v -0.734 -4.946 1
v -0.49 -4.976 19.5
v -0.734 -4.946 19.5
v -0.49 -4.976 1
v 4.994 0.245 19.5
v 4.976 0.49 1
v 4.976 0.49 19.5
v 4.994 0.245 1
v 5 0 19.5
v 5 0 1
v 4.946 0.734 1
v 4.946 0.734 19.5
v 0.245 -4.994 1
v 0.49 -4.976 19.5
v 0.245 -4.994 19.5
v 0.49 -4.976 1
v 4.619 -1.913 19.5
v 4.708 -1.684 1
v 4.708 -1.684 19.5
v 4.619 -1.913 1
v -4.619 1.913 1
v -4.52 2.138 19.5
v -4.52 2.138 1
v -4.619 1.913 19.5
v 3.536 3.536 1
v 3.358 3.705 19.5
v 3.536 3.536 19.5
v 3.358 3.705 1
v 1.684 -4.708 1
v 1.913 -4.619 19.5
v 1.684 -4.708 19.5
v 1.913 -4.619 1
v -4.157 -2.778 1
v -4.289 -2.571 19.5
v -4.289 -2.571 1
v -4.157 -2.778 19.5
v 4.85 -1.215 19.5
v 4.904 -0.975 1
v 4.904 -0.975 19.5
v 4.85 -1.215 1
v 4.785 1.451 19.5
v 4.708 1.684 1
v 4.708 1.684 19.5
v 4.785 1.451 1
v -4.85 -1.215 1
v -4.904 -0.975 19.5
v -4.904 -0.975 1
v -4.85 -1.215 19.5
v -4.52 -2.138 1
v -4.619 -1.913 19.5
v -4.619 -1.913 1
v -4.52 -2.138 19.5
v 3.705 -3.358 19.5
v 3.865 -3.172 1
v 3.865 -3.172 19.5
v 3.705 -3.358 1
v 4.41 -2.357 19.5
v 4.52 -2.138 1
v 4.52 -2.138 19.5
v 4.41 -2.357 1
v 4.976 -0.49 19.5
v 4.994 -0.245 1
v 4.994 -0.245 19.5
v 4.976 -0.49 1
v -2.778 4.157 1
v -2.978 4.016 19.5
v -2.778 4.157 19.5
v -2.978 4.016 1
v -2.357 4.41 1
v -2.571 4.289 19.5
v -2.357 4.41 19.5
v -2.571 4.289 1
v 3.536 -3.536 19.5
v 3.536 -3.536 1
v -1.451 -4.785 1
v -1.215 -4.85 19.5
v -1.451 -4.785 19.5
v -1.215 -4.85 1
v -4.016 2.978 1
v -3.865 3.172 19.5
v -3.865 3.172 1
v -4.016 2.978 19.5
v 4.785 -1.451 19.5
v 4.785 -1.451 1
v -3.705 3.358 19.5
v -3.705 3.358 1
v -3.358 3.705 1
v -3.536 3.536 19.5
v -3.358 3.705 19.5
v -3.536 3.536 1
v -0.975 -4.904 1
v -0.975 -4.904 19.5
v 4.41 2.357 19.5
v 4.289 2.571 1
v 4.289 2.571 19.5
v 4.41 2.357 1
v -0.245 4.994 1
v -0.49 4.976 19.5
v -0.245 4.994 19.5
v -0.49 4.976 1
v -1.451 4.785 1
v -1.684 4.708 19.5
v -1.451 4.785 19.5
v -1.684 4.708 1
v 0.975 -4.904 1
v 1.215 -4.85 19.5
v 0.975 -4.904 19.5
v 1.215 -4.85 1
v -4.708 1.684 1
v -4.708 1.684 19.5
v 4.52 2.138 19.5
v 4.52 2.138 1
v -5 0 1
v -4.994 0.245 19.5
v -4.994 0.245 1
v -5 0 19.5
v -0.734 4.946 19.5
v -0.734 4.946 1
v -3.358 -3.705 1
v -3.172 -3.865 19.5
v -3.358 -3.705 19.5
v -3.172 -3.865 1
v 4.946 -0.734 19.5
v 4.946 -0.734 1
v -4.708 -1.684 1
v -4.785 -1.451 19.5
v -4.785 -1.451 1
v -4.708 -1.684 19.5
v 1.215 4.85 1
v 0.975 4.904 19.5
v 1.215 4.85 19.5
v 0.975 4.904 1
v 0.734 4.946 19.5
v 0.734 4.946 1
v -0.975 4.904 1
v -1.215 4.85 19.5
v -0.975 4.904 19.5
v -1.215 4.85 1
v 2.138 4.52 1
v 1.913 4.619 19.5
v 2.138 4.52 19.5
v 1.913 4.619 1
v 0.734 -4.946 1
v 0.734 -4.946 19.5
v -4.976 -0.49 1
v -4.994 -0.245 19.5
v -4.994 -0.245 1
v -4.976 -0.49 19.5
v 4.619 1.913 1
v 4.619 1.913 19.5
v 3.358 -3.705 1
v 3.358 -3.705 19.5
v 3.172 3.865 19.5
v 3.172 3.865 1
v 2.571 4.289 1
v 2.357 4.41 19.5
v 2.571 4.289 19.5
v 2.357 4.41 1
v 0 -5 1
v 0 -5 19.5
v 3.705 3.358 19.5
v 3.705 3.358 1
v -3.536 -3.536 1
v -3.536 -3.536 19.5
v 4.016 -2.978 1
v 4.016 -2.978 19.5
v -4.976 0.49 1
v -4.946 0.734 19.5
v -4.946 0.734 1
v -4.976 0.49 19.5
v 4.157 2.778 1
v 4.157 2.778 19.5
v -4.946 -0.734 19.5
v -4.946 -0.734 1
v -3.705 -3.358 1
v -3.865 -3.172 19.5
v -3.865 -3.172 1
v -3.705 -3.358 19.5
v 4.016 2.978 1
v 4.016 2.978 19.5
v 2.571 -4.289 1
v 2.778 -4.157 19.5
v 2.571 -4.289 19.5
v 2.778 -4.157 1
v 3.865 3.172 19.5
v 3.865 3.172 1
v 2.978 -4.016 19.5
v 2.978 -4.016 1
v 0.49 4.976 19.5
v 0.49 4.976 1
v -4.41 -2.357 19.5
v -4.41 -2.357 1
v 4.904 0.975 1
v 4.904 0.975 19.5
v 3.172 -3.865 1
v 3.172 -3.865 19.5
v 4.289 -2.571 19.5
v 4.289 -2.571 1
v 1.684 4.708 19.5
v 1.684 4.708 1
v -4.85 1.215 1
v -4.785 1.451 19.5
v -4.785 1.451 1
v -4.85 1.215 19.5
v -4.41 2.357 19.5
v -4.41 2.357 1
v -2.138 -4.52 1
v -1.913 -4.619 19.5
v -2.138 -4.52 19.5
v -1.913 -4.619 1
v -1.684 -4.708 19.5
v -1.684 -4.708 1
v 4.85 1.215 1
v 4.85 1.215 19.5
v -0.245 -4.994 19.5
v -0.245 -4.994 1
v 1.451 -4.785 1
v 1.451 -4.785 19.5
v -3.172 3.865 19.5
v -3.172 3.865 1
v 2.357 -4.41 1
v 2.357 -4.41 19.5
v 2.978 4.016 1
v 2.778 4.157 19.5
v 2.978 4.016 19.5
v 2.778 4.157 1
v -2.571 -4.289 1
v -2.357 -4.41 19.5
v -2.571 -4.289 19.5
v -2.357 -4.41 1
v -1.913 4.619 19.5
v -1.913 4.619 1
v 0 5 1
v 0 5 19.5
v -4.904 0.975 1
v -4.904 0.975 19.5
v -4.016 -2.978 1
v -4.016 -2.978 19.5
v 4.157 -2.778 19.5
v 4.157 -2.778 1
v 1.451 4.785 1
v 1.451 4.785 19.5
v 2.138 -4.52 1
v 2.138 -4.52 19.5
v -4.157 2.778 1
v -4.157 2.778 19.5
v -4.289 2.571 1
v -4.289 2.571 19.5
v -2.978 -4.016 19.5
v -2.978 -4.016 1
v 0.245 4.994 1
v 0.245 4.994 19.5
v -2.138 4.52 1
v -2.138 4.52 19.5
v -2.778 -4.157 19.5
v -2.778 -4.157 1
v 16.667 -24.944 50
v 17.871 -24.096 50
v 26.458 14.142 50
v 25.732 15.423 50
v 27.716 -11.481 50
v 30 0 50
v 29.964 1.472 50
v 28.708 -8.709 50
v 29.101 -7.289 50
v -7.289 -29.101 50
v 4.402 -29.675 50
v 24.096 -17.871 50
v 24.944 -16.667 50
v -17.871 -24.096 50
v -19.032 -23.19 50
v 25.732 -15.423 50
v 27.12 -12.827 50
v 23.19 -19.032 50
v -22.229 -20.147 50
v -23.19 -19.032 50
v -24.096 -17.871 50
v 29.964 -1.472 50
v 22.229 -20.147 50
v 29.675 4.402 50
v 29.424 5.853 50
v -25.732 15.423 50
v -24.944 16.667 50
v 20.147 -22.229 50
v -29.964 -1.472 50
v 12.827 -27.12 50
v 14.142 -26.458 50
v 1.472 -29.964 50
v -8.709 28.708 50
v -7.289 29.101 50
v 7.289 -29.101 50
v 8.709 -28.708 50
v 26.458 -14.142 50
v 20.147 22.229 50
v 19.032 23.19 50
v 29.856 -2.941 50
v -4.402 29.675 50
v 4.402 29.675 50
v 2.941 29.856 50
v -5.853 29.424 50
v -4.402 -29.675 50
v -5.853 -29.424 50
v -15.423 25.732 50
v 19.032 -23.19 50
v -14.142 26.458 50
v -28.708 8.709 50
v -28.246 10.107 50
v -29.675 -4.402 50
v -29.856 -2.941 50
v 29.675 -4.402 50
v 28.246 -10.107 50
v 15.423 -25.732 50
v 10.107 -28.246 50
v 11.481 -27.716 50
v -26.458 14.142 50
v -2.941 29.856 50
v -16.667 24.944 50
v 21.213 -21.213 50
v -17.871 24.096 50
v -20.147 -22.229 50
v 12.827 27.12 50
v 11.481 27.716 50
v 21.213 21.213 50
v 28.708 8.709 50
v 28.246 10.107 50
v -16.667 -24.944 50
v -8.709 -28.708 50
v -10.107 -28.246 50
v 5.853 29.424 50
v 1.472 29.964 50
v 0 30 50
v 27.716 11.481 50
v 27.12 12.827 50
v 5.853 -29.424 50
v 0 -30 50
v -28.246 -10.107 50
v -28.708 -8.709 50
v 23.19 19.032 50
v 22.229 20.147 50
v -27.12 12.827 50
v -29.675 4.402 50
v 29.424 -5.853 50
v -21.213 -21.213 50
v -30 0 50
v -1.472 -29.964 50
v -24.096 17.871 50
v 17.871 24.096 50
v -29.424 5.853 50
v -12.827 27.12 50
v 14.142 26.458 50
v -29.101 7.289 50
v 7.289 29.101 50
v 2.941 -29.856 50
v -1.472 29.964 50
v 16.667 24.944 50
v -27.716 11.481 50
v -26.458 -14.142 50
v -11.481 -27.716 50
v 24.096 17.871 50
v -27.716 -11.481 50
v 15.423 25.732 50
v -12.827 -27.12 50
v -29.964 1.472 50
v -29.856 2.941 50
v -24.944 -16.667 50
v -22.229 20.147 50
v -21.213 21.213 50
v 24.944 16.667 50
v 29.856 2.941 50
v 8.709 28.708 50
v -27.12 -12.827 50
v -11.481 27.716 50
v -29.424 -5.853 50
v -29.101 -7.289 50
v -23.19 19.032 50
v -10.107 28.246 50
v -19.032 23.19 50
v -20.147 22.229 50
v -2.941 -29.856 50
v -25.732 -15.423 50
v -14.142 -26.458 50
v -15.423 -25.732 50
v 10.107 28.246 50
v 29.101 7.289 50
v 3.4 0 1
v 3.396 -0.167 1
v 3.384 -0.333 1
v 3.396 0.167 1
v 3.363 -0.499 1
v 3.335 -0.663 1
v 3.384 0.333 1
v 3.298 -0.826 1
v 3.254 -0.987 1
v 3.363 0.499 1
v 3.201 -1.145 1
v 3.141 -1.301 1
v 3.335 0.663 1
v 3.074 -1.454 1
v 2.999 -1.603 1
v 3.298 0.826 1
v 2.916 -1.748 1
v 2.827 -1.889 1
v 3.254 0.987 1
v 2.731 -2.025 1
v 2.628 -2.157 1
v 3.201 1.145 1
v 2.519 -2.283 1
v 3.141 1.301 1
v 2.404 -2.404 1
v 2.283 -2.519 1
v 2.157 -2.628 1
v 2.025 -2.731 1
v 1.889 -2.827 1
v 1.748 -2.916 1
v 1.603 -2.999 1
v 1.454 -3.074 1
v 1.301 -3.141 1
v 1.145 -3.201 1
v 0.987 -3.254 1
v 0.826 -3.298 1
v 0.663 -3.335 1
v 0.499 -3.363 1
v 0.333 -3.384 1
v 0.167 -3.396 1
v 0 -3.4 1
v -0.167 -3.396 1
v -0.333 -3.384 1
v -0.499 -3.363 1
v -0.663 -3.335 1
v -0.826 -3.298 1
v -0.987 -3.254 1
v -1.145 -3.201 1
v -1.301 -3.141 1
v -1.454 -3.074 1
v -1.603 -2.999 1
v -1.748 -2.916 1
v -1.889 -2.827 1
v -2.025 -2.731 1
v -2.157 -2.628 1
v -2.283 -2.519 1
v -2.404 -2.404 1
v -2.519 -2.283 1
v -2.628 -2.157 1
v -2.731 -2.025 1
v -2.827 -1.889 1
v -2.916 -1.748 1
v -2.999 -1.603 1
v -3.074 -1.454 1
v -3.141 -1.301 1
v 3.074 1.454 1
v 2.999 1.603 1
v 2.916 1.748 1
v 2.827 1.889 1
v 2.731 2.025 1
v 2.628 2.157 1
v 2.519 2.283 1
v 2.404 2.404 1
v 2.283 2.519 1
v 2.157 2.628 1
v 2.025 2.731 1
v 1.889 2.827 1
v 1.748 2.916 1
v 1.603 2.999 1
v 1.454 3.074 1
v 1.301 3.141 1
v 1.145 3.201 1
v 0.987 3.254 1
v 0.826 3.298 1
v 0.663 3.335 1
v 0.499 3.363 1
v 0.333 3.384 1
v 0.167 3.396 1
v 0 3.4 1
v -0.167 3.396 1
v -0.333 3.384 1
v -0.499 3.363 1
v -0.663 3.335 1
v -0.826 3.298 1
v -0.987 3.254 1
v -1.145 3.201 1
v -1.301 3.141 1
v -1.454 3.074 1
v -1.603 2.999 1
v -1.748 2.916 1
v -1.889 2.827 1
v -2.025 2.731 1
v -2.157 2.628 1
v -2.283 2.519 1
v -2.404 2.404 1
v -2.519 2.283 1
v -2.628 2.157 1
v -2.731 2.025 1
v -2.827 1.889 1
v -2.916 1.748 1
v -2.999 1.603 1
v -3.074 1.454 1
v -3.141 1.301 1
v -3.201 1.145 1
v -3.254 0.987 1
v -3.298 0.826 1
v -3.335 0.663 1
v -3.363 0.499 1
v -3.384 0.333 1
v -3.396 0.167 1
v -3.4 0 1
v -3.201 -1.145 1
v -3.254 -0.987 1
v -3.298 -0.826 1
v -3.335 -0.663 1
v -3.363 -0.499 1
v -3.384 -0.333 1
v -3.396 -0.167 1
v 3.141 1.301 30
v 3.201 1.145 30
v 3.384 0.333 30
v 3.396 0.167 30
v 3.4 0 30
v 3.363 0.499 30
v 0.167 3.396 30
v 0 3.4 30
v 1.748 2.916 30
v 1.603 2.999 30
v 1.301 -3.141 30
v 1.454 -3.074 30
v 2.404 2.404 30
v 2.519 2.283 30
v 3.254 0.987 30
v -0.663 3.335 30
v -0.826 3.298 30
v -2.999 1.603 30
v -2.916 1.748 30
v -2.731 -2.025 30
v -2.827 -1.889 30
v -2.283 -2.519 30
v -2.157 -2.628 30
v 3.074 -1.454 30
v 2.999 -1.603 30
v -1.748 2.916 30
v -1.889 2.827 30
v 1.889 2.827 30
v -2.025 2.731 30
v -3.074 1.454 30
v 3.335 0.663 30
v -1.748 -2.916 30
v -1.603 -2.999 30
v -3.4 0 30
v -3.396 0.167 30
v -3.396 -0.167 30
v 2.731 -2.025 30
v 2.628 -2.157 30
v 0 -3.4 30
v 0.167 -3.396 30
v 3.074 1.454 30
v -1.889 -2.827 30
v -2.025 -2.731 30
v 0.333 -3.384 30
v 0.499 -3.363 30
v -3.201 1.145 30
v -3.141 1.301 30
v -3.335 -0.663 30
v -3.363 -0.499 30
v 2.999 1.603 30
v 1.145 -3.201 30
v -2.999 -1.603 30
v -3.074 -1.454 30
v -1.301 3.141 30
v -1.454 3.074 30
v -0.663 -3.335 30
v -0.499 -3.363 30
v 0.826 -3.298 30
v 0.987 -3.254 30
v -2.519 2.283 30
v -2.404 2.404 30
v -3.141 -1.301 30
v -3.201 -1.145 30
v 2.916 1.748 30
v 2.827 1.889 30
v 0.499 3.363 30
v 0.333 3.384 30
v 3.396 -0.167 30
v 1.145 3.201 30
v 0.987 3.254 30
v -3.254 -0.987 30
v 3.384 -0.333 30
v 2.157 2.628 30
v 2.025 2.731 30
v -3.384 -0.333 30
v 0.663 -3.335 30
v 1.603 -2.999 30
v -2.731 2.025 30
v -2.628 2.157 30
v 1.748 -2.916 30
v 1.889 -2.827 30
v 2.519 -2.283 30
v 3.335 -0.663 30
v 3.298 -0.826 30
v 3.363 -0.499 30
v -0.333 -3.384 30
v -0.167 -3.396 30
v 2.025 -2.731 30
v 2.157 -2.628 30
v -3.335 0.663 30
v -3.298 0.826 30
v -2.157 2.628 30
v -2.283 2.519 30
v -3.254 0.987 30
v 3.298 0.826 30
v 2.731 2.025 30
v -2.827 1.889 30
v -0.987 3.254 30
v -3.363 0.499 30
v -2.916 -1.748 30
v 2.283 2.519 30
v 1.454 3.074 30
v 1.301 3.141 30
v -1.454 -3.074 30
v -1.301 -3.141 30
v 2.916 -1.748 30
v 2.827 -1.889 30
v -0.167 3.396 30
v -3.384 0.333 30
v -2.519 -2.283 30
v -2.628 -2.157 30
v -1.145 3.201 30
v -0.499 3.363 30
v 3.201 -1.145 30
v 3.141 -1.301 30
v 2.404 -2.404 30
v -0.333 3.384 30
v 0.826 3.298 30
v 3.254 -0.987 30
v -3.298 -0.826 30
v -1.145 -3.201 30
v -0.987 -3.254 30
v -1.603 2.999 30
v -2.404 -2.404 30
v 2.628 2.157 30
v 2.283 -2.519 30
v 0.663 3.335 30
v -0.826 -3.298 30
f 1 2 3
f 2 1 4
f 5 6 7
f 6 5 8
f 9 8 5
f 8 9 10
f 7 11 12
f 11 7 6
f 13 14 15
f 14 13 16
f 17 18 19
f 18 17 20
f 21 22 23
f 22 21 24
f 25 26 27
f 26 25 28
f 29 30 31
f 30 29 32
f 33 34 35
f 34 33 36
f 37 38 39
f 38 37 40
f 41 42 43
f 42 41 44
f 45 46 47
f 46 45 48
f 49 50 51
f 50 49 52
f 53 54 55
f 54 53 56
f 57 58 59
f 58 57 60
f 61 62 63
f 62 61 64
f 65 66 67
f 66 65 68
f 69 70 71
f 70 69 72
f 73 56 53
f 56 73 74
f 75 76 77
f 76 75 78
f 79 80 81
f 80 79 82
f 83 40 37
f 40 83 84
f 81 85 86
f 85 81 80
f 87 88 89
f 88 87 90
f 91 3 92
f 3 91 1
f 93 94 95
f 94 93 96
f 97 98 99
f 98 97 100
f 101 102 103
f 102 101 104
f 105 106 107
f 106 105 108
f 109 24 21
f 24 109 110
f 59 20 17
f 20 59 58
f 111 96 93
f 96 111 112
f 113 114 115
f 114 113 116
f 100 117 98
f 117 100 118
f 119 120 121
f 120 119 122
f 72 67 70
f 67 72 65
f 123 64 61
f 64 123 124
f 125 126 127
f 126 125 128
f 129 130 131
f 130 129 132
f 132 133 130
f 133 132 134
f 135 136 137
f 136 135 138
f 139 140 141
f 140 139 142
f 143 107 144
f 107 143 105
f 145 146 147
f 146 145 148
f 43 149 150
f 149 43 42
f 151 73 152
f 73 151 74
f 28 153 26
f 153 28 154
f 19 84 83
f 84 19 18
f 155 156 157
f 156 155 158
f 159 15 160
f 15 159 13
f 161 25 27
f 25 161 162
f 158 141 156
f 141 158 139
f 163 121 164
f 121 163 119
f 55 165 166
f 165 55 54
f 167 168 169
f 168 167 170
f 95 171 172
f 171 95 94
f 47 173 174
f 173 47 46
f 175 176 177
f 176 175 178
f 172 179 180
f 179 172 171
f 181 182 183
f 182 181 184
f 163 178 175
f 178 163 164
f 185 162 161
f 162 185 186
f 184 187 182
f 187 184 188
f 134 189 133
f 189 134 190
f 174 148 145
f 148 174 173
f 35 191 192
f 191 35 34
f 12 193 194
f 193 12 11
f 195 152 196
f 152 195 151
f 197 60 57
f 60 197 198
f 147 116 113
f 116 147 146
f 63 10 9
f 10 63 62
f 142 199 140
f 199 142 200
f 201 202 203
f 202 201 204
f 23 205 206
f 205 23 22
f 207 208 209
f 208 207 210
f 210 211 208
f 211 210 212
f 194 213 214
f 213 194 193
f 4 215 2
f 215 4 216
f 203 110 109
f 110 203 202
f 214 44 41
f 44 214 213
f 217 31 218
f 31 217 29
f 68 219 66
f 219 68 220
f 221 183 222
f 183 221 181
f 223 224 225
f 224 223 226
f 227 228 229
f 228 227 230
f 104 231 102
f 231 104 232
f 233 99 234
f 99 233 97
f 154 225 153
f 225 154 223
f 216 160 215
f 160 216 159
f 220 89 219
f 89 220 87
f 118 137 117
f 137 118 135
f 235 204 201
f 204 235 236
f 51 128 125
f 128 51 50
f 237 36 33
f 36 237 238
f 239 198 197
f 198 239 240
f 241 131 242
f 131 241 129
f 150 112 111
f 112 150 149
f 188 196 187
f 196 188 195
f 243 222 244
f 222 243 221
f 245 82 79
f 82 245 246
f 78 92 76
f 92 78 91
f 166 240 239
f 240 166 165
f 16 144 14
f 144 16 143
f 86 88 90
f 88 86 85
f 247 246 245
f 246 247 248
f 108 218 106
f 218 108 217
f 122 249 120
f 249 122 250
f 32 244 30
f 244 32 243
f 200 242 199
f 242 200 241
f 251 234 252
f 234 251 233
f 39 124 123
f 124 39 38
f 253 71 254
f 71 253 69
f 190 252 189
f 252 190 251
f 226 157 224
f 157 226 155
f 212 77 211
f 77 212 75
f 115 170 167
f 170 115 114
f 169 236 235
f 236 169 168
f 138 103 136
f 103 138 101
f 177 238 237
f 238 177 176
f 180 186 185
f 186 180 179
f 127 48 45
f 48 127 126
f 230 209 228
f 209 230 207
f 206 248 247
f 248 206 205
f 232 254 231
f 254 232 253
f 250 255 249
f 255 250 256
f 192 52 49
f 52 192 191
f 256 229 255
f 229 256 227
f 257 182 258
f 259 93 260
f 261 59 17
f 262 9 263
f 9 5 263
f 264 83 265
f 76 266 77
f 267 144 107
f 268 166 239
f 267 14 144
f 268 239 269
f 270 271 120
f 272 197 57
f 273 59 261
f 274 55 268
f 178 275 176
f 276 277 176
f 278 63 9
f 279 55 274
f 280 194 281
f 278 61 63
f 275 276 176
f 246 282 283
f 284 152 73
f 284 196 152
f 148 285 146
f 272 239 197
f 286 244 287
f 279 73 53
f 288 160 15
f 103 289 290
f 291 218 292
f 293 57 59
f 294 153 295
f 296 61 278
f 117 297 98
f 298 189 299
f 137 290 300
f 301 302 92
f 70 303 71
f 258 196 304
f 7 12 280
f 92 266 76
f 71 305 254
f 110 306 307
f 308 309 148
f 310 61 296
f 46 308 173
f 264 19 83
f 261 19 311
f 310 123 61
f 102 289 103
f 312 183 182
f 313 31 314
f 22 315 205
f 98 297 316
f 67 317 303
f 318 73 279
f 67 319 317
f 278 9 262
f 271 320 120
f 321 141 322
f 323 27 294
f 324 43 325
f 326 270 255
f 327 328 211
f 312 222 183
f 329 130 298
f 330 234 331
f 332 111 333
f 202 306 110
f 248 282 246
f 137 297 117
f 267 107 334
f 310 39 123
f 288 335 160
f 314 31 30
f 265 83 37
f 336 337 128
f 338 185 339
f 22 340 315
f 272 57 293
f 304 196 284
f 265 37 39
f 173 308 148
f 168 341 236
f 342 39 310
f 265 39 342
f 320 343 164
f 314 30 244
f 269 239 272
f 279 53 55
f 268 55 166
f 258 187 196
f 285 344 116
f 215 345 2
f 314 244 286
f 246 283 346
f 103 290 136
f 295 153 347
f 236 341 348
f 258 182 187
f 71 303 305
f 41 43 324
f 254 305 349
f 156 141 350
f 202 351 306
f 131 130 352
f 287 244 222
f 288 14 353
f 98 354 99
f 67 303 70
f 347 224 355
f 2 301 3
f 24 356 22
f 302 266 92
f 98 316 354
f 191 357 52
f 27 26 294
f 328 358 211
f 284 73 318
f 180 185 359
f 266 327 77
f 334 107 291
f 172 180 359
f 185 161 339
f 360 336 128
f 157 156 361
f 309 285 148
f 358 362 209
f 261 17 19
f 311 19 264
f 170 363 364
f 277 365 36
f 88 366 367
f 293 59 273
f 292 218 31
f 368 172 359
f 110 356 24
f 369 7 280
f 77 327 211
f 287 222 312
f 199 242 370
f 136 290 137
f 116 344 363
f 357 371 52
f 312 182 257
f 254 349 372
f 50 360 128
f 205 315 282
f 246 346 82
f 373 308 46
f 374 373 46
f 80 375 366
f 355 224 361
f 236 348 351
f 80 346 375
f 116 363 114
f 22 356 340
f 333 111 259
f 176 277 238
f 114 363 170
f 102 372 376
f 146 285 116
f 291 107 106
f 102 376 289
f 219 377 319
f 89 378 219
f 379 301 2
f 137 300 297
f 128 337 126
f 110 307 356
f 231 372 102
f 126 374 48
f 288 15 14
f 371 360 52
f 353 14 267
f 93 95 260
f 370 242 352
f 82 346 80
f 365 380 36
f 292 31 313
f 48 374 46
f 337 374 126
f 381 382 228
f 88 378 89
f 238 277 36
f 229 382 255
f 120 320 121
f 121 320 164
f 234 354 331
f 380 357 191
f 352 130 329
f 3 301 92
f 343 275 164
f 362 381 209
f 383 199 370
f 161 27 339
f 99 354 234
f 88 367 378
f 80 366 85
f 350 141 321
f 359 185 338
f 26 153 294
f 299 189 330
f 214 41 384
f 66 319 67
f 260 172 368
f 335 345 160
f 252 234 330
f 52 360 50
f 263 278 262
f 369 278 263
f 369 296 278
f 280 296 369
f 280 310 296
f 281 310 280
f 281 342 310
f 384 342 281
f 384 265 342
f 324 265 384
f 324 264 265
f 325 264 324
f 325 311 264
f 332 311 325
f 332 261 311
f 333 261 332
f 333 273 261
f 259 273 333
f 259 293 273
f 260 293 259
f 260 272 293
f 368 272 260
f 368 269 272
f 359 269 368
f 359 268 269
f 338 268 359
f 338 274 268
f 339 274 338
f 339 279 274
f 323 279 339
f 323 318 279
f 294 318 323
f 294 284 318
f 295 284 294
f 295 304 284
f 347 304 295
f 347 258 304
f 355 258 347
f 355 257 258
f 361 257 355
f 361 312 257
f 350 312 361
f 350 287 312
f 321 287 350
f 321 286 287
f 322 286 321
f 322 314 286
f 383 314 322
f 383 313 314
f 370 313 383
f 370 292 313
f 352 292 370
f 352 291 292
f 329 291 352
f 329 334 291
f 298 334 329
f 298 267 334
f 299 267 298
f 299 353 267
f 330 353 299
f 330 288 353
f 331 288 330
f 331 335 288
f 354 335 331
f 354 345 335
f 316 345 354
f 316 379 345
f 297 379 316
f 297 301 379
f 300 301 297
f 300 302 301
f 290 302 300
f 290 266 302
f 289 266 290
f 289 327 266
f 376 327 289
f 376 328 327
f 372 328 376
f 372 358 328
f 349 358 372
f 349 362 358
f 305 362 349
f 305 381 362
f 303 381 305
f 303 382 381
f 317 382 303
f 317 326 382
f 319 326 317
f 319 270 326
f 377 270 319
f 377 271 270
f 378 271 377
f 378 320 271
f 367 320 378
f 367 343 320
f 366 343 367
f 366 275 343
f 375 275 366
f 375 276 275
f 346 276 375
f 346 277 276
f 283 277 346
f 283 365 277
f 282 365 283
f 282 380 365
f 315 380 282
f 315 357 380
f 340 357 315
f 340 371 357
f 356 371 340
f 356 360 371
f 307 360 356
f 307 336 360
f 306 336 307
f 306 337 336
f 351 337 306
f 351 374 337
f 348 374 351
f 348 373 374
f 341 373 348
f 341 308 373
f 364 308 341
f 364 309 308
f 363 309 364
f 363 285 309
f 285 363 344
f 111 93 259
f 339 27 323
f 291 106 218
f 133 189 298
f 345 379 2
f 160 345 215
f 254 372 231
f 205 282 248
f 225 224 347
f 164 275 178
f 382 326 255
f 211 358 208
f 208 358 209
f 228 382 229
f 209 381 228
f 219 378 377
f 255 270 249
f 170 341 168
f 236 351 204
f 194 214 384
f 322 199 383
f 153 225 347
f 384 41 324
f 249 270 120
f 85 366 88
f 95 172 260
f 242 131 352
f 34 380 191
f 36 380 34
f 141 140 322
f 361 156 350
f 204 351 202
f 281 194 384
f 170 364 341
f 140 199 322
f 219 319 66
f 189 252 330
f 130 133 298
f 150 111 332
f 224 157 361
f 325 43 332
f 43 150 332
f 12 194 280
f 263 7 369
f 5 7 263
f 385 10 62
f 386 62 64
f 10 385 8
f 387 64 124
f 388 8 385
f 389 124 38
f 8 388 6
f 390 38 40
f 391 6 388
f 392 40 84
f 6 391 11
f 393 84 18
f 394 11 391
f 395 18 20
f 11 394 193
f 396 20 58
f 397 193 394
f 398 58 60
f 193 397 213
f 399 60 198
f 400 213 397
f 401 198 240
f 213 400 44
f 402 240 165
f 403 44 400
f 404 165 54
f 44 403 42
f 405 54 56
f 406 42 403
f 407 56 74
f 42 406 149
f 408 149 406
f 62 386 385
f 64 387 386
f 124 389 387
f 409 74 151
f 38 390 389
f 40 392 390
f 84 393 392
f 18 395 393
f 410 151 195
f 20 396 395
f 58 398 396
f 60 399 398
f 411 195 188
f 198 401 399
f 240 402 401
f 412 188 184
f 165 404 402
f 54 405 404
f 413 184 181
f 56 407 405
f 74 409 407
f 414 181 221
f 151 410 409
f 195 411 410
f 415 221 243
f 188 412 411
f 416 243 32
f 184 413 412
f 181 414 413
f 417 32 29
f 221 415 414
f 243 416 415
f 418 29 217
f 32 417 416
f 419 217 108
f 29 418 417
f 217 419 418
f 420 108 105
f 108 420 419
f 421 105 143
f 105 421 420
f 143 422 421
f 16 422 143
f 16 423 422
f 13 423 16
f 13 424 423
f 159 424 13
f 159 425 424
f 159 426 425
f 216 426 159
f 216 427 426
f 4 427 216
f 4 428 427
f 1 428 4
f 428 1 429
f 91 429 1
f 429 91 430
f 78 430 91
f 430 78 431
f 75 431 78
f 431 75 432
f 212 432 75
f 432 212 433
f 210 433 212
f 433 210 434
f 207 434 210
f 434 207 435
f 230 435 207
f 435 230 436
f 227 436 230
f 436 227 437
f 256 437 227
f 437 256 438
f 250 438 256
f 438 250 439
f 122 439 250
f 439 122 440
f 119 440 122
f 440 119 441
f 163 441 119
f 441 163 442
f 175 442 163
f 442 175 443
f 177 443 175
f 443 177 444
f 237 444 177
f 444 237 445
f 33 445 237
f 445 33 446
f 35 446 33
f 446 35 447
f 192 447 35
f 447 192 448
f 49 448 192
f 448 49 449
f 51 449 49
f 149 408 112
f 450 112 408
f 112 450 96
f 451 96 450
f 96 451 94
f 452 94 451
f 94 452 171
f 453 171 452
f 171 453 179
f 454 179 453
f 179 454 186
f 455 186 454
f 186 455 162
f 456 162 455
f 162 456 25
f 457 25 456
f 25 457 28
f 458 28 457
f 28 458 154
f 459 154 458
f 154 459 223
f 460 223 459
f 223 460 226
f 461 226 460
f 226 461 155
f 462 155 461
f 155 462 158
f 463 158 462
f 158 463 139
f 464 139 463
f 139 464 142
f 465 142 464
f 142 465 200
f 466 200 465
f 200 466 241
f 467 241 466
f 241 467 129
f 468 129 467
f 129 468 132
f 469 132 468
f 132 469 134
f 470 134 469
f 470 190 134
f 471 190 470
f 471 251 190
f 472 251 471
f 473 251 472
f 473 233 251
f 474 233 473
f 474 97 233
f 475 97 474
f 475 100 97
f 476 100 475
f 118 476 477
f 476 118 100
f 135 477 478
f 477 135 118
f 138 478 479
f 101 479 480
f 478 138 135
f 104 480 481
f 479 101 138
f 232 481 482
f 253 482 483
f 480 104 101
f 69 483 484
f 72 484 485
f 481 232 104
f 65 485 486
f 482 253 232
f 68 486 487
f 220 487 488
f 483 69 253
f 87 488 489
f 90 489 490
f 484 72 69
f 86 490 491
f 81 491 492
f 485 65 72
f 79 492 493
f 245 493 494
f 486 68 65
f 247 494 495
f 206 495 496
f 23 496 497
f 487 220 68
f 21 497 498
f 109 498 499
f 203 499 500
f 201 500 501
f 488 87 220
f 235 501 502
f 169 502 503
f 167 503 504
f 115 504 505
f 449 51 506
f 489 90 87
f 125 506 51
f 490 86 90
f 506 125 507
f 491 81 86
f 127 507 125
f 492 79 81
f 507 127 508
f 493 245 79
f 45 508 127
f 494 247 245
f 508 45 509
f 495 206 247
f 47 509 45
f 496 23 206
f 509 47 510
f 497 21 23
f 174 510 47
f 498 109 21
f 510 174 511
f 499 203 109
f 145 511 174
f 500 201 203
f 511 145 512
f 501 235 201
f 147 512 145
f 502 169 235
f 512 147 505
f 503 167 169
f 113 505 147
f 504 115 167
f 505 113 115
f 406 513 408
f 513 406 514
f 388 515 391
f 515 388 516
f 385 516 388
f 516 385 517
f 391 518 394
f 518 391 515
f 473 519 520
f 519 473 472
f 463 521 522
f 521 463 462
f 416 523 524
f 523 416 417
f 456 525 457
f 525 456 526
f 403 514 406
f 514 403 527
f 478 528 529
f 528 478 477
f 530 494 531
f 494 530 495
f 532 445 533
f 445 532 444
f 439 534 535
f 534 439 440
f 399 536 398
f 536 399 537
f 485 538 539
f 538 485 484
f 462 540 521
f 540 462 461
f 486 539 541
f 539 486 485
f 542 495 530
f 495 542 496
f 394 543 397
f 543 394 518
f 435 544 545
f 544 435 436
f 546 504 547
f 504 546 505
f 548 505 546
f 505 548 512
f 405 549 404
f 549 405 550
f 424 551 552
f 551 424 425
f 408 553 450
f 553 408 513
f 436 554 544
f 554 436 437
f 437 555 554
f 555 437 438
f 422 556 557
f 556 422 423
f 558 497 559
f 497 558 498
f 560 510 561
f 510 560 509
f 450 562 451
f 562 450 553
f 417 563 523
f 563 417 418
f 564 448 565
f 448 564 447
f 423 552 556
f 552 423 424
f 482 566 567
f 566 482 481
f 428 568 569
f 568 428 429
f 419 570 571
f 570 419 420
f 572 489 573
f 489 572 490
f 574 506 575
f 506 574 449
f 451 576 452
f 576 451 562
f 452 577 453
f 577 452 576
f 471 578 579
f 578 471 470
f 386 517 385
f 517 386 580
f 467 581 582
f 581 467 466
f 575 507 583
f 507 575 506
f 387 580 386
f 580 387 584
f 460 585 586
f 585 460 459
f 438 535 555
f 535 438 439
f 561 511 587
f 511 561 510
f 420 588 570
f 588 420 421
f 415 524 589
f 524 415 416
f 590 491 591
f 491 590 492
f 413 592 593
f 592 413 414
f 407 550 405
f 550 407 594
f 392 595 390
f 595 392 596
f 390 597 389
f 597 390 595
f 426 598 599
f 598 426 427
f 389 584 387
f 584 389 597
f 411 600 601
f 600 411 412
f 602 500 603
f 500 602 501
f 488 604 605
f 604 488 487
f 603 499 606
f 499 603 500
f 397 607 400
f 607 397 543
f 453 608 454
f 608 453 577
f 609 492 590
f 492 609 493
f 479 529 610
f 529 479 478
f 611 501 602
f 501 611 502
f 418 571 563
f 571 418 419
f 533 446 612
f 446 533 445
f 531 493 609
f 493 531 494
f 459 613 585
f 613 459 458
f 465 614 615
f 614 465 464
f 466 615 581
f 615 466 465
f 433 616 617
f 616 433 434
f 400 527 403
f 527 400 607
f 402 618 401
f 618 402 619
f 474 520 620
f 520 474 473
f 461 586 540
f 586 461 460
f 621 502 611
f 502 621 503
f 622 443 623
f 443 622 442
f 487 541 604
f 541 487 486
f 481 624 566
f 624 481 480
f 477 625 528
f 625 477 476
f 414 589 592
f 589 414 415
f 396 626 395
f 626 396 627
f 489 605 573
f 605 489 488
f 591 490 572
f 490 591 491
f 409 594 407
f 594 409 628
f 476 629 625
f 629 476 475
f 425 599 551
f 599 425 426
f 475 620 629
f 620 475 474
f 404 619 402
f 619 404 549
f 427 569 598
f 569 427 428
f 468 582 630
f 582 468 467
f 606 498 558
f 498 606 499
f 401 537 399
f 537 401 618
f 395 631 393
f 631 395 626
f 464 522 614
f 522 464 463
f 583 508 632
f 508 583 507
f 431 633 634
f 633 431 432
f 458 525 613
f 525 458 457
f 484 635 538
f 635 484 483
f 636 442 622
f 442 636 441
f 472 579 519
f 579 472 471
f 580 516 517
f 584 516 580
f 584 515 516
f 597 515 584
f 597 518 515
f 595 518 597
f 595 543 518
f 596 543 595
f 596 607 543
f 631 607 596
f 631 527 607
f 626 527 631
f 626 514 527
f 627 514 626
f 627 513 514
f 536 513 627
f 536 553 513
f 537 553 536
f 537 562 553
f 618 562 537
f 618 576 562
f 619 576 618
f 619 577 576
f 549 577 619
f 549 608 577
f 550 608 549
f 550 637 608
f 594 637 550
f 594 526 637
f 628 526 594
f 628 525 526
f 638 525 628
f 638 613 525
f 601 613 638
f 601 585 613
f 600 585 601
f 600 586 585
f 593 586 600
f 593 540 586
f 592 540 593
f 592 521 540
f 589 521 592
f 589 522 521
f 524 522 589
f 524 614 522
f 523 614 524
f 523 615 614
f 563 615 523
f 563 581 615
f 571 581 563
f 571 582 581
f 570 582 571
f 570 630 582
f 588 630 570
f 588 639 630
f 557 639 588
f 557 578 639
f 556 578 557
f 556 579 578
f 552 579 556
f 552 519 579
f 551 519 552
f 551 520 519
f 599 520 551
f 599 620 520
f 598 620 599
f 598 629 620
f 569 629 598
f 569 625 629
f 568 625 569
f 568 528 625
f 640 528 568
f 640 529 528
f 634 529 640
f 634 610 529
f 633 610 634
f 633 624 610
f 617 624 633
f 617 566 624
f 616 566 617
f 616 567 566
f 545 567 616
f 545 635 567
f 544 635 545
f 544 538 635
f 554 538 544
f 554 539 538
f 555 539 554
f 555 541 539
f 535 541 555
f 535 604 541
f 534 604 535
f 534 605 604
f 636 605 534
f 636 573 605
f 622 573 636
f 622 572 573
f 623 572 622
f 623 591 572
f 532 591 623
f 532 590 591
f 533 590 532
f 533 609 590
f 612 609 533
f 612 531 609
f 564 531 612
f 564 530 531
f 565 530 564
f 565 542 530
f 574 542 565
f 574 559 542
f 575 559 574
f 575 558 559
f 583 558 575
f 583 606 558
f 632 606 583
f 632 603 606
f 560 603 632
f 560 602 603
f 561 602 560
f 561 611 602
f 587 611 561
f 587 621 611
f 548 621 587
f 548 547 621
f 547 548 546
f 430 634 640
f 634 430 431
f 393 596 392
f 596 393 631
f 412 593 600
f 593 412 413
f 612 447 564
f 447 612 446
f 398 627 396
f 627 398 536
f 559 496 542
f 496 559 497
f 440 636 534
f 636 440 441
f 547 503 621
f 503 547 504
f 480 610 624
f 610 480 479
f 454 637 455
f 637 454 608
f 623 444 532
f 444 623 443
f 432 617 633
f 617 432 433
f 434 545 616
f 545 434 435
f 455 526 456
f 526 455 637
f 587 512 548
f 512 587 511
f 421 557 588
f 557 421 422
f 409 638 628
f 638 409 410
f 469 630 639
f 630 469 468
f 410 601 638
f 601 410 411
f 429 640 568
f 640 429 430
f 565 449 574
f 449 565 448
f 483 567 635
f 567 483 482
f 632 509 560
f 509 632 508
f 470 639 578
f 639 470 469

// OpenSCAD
// Lab funnel - printed upright, wide opening at the top
// Straight spout from z = 0 to z = 20, conical body from z = 20 to z = 50

// ---- Dimensions (mm) ----
spout_od      = 10;    // outer diameter of spout
spout_h       = 20;    // spout height (z = 0 to z = 20)
cone_od_top   = 60;    // outer diameter of cone at rim (z = 50)
cone_od_base  = 10;    // outer diameter of cone at base (z = 20)
cone_h        = 30;    // cone height (z = 20 to z = 50)
wall          = 1.6;   // wall thickness everywhere
eps           = 0.5;   // overlap for clean boolean cuts

$fn = 128;

// Derived
bore = spout_od - 2 * wall;   // 6.8 mm bore in spout

difference() {
    union() {
        // Spout
        cylinder(d = spout_od, h = spout_h);

        // Cone, slightly overlapping the spout for a solid union
        translate([0, 0, spout_h - eps])
            cylinder(d1 = cone_od_base, d2 = cone_od_top, h = cone_h + eps);
    }

    // Bottom cut - open bottom at z = 0
    translate([0, 0, -eps])
        cylinder(d = spout_od, h = eps + 1);

    // Axial bore through the spout (extends into cone to keep a clear channel)
    translate([0, 0, -eps])
        cylinder(d = bore, h = spout_h + eps + 10);
}
